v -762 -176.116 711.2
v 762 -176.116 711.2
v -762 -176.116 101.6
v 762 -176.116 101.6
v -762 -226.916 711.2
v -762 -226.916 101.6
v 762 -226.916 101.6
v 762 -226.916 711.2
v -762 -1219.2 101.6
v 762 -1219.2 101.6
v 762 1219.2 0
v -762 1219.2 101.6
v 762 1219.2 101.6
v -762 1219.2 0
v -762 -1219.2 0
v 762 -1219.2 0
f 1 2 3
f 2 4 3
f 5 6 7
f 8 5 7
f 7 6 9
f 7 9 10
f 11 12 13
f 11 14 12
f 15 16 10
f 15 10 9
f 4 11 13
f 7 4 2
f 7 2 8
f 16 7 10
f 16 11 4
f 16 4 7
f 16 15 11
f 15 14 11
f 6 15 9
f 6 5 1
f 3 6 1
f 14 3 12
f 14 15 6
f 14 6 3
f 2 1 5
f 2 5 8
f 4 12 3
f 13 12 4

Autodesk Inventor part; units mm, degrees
ref_plane "YZ Plane" through (0, 0, 0) normal (1, 0, 0) x (0, 1, 0)
ref_plane "XZ Plane" through (0, 0, 0) normal (0, 1, 0) x (-1, 0, 0)
ref_plane "XY Plane" through (0, 0, 0) normal (0, 0, 1) x (1, 0, 0)
sketch "Sketch1" plane through (0, 0, 0) normal (0, 0, 1) x (1, 0, 0)
  line L0 (762, -1219.2) -> (-762, -1219.2)
  line L1 (-762, -1219.2) -> (-762, 1219.2)
  line L2 (-762, 1219.2) -> (762, 1219.2)
  line L3 (762, 1219.2) -> (762, -1219.2)
  line L4 (762, -1219.2) -> (-762, 1219.2) construction
  line L5 (-762, -1219.2) -> (762, 1219.2) construction
  point P0 (0, 0)
  dimension "d0" = 1524
  dimension "d5" = 2438.4
extrude "Extrusion1" add sketch "Sketch1" along normal blind 101.6
sketch "Sketch2" plane through (0, 0, 101.6) normal (0, 0, 1) x (1, 0, 0)
  line L0 (-762, -226.9161) -> (762, -226.9161)
  line L1 (762, -226.9161) -> (762, -176.1161)
  line L2 (762, -176.1161) -> (-762, -176.1161)
  line L3 (-762, -176.1161) -> (-762, -226.9161)
  line L4 (-762, 1219.2) -> (-762, -1219.2) projected
  point P0 (0, 0)
  dimension "d6" = 50.8
  dimension "d7" = 1524
  dimension "d8" = 0
extrude "Extrusion2" add sketch "Sketch2" along normal blind 609.6
properties part number "Wall_desk"
